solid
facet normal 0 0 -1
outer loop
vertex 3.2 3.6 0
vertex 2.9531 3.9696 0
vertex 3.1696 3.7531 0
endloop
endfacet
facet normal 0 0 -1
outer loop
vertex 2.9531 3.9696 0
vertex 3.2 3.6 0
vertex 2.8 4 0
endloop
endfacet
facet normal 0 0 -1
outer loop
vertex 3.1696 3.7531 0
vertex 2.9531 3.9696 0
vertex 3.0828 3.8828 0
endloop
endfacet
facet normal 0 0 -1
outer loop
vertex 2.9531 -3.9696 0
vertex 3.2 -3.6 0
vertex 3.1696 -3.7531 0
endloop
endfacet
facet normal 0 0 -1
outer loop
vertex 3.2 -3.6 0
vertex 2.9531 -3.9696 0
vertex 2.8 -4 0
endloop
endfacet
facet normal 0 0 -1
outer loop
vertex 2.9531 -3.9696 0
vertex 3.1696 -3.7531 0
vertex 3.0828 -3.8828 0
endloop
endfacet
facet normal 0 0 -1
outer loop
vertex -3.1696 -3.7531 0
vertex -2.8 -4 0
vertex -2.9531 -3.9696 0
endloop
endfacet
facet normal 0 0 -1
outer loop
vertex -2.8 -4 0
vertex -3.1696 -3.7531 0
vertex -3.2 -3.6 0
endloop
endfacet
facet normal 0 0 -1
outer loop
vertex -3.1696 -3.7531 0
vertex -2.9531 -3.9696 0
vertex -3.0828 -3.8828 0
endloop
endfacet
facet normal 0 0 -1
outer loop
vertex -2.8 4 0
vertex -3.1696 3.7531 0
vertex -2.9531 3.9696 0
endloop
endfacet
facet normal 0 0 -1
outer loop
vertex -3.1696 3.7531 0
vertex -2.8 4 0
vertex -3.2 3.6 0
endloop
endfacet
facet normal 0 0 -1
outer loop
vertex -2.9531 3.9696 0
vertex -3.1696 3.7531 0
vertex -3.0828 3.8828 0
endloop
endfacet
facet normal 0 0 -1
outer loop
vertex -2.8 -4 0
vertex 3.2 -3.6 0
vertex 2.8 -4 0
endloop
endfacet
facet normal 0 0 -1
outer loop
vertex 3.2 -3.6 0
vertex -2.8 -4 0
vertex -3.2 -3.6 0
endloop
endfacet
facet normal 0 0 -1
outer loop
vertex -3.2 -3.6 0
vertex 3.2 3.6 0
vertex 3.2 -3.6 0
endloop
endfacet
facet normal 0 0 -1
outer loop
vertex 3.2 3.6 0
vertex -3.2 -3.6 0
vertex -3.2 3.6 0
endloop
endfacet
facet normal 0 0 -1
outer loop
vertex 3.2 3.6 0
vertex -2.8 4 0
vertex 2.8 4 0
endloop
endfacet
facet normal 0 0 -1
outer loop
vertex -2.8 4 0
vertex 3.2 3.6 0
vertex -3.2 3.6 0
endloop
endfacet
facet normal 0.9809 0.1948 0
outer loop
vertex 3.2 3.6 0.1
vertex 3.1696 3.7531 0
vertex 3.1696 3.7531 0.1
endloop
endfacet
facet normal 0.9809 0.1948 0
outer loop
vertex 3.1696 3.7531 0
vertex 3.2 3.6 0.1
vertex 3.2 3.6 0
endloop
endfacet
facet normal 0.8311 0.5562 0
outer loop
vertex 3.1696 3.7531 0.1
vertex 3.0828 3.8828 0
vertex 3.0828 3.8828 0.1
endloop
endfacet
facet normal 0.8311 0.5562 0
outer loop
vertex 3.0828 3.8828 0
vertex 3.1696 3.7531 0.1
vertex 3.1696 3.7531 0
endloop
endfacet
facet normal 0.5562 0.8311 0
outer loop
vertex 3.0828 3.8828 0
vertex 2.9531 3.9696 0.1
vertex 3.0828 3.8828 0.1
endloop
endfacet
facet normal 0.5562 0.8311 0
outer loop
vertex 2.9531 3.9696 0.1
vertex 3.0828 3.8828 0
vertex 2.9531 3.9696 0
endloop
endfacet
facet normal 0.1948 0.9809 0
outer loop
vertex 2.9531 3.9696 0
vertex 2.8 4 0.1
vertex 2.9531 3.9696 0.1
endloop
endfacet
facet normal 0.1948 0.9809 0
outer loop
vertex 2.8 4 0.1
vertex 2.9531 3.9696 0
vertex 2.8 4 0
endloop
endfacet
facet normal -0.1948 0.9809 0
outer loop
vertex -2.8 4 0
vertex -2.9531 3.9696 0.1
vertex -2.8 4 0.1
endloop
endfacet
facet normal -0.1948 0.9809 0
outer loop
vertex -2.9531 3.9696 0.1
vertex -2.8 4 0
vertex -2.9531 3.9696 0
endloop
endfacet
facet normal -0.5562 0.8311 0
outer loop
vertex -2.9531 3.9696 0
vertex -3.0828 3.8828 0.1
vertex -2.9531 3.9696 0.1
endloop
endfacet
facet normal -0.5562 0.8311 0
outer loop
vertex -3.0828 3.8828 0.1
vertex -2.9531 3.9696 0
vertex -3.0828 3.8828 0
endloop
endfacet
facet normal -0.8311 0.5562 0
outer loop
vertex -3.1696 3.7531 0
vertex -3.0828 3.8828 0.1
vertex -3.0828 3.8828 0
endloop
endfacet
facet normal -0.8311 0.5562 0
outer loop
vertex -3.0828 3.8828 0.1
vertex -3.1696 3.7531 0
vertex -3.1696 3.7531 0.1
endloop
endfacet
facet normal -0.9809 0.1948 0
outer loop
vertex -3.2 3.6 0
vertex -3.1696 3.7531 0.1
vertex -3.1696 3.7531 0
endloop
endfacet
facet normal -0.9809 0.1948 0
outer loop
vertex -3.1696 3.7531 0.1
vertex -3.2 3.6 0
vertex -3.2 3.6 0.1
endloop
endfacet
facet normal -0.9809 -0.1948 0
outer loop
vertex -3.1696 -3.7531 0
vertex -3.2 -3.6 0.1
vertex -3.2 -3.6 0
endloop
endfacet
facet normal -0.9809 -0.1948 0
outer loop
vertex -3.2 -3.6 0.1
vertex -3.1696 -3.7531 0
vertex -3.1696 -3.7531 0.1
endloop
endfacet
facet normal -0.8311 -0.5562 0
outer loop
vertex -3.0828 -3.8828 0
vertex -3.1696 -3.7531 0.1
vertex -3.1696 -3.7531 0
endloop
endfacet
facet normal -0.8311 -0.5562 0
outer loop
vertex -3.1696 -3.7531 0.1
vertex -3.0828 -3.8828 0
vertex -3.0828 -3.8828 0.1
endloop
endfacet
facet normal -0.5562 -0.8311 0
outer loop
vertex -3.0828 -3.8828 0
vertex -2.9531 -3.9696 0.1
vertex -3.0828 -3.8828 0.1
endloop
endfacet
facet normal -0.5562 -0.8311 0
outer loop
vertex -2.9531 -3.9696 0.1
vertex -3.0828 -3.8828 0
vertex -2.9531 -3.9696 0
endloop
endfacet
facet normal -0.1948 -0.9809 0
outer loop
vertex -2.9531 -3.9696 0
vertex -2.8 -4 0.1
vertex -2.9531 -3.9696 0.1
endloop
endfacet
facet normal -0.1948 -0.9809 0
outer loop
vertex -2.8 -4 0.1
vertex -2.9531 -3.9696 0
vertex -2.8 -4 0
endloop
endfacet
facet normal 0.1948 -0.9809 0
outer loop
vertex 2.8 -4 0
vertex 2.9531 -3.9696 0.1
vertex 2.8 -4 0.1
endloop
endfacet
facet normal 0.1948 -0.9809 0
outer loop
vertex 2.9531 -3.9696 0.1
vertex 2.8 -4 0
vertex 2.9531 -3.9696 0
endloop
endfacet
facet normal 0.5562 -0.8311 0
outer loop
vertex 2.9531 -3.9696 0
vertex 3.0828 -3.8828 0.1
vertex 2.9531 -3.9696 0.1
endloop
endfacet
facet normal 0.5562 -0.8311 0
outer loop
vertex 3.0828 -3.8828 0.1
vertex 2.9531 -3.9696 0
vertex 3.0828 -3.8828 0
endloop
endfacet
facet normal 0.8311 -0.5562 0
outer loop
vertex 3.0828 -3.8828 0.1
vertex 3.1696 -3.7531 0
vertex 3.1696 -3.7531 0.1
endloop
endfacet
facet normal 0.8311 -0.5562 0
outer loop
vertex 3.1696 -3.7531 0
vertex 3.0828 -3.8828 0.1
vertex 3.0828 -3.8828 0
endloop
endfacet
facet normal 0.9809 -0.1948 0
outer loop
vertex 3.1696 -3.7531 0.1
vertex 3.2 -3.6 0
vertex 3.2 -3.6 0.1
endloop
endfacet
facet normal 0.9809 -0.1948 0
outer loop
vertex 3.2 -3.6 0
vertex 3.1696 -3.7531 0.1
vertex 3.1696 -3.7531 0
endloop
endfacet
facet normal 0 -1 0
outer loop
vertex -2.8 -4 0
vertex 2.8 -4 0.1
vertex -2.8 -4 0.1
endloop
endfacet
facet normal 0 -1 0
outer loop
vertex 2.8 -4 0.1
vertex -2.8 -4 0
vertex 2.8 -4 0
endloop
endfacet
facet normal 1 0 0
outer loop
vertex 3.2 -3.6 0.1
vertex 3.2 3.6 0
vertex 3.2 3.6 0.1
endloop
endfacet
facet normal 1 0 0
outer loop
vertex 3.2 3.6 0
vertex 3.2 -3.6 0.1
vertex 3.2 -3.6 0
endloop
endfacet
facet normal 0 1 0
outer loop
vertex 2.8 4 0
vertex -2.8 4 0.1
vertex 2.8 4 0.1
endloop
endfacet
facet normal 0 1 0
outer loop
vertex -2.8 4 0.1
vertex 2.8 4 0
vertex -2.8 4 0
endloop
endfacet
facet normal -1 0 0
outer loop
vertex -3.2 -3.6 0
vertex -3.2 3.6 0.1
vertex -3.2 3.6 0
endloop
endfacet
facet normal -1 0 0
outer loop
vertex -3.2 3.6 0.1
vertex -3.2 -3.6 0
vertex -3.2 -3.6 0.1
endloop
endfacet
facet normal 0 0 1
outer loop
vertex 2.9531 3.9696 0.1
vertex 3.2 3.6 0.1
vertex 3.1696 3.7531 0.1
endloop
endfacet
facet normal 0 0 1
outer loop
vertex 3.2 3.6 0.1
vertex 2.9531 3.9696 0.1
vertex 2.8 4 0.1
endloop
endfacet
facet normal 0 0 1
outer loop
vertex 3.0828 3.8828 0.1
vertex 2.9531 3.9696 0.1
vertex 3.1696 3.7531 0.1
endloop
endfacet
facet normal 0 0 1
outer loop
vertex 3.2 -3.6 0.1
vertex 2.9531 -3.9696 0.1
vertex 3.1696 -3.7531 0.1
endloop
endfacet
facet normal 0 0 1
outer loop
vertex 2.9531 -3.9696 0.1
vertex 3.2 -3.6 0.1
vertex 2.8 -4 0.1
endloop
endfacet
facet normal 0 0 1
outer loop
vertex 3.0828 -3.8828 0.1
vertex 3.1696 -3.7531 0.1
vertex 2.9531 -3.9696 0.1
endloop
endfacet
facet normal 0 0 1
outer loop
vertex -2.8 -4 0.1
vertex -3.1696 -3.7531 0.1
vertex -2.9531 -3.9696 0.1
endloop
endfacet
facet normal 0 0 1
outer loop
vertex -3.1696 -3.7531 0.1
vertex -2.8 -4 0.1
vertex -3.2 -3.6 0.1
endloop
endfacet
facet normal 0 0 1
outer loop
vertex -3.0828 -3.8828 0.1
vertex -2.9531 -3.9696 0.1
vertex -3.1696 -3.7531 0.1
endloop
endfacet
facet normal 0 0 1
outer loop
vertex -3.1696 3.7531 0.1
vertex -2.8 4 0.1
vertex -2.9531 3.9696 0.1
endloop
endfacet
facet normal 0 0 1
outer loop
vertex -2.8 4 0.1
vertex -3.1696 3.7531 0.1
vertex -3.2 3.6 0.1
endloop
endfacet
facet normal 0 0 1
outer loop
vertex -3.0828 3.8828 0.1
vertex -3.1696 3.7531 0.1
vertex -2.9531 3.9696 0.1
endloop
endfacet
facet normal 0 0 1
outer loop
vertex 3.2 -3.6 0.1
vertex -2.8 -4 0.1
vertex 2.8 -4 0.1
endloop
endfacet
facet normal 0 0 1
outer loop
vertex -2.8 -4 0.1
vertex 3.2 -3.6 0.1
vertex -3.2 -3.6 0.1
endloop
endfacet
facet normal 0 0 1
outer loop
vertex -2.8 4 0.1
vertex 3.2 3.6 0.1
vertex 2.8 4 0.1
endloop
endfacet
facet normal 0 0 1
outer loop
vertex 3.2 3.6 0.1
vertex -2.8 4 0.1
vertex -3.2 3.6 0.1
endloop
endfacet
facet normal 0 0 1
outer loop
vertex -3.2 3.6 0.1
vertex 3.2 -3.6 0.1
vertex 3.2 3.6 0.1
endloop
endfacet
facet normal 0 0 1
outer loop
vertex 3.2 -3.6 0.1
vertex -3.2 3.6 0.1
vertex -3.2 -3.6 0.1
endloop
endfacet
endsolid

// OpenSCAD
// file: ../p/1-4cyli.scad
use <../lib.scad>
function ldraw_lib__1_4cyli() = [
// 0 Cylinder 0.25
// 0 Name: 1-4cyli.dat
// 0 Author: James Jessiman
// 0 !LDRAW_ORG Primitive UPDATE 2012-01
// 0 !LICENSE Licensed under CC BY 4.0 : see CAreadme.txt
// 
// 0 BFC CERTIFY CCW
  [0,"BFC","CERTIFY"],
  [0,"BFC","CCW"],
// 
// 0 !HISTORY 2002-03-23 [sbliss] Added BFC statement.
// 0 !HISTORY 2002-04-25 [PTadmin] Official Update 2002-02
// 0 !HISTORY 2007-06-22 [PTadmin] Header formatted for Contributor Agreement
// 0 !HISTORY 2008-07-01 [PTadmin] Official Update 2008-01
// 0 !HISTORY 2012-02-16 [Philo] Changed to CCW
// 0 !HISTORY 2012-03-30 [PTadmin] Official Update 2012-01
// 
// 
// 4 16 1 1 0 0.9239 1 0.3827 0.9239 0 0.3827 1 0 0
  [4,16,1,1,0,0.9239,1,0.3827,0.9239,0,0.3827,1,0,0],
// 5 24 1 0 0 1 1 0 0.9239 0 0.3827 1 0 -1
  [5,24,1,0,0,1,1,0,0.9239,0,0.3827,1,0,-1],
// 4 16 0.9239 1 0.3827 0.7071 1 0.7071 0.7071 0 0.7071 0.9239 0 0.3827
  [4,16,0.9239,1,0.3827,0.7071,1,0.7071,0.7071,0,0.7071,0.9239,0,0.3827],
// 5 24 0.9239 0 0.3827 0.9239 1 0.3827 0.7071 0 0.7071 1 0 0
  [5,24,0.9239,0,0.3827,0.9239,1,0.3827,0.7071,0,0.7071,1,0,0],
// 4 16 0.7071 1 0.7071 0.3827 1 0.9239 0.3827 0 0.9239 0.7071 0 0.7071
  [4,16,0.7071,1,0.7071,0.3827,1,0.9239,0.3827,0,0.9239,0.7071,0,0.7071],
// 5 24 0.7071 0 0.7071 0.7071 1 0.7071 0.3827 0 0.9239 0.9239 0 0.3827
  [5,24,0.7071,0,0.7071,0.7071,1,0.7071,0.3827,0,0.9239,0.9239,0,0.3827],
// 4 16 0.3827 1 0.9239 0 1 1 0 0 1 0.3827 0 0.9239
  [4,16,0.3827,1,0.9239,0,1,1,0,0,1,0.3827,0,0.9239],
// 5 24 0.3827 0 0.9239 0.3827 1 0.9239 0 0 1 0.7071 0 0.7071
  [5,24,0.3827,0,0.9239,0.3827,1,0.9239,0,0,1,0.7071,0,0.7071],
// 5 24 0 0 1 0 1 1 0.3827 0 0.9239 -1 0 1
  [5,24,0,0,1,0,1,1,0.3827,0,0.9239,-1,0,1],
];
module ldraw_lib__1_4cyli(step=0, col=false, unit=2/5, alt=false, line=0.2, solid=!$preview)
    makepoly(ldraw_lib__1_4cyli(), step=step, col=col, unit=unit, alt=alt, line=line, solid=solid);
ldraw_lib__1_4cyli(line=0.2);
// file: ../p/1-4chrd.scad
use <../lib.scad>
function ldraw_lib__1_4chrd() = [
// 0 Chord 0.25
// 0 Name: 1-4chrd.dat
// 0 Author: Max Martin Richter [MMR1988]
// 0 !LDRAW_ORG Primitive UPDATE 2023-05
// 0 !LICENSE Licensed under CC BY 4.0 : see CAreadme.txt
// 
// 0 BFC CERTIFY CCW
  [0,"BFC","CERTIFY"],
  [0,"BFC","CCW"],
// 
// 0 !HISTORY 2004-04-22 [PTadmin] Official Update 2004-02
// 0 !HISTORY 2007-10-09 [PTadmin] Header formatted for Contributor Agreement
// 0 !HISTORY 2008-07-01 [PTadmin] Official Update 2008-01
// 0 !HISTORY 2012-08-02 [MMR1988] Re-creation with PrimGen2 and Rectifier
// 0 !HISTORY 2012-08-09 [PTadmin] Official Update 2012-02
// 0 !HISTORY 2023-10-27 [OrionP] Change author to MMR1988 from hafhead
// 0 !HISTORY 2023-10-31 [OrionP] Official Update 2023-05
// 
// 4 16 0.9239 0 0.3827 0.3827 0 0.9239 0 0 1 1 0 0
  [4,16,0.9239,0,0.3827,0.3827,0,0.9239,0,0,1,1,0,0],
// 3 16 0.7071 0 0.7071 0.3827 0 0.9239 0.9239 0 0.3827
  [3,16,0.7071,0,0.7071,0.3827,0,0.9239,0.9239,0,0.3827],
];
module ldraw_lib__1_4chrd(step=0, col=false, unit=2/5, alt=false, line=0.2, solid=!$preview)
    makepoly(ldraw_lib__1_4chrd(), step=step, col=col, unit=unit, alt=alt, line=line, solid=solid);
ldraw_lib__1_4chrd(line=0.2);
// main file
use <../lib.scad>
use <../p/1-4chrd.scad>
use <../p/1-4cyli.scad>
function ldraw_lib__6280006m() = [
// 0 Sticker  1 x  0.8 White Rectangle
// 0 Name: 6280006m.dat
// 0 Author: Gabriel Läufer [Dr.Bricktacular]
// 0 !LDRAW_ORG Part UPDATE 2025-02
// 0 !LICENSE Licensed under CC BY 4.0 : see CAreadme.txt
// 
// 0 BFC CERTIFY CCW
  [0,"BFC","CERTIFY"],
  [0,"BFC","CCW"],
// 
// 0 !KEYWORDS Batmobile (1989), Bricklink 76139stk01, Set 76193
// 0 !KEYWORDS Tim Burton's Batman
// 
// 0 !HISTORY 2025-02-27 [OrionP] Official Update 2025-02
// 
// 0 // Sticker-Bottom
// 1 16 7 0 9 1 0 0 0 -1 0 0 0 1 1-4chrd.dat
  [1,16,7,0,9,1,0,0,0,-1,0,0,0,1, ldraw_lib__1_4chrd()],
// 1 16 7 0 -9 0 0 1 0 -1 0 -1 0 0 1-4chrd.dat
  [1,16,7,0,-9,0,0,1,0,-1,0,-1,0,0, ldraw_lib__1_4chrd()],
// 1 16 -7 0 -9 -1 0 0 0 -1 0 0 0 -1 1-4chrd.dat
  [1,16,-7,0,-9,-1,0,0,0,-1,0,0,0,-1, ldraw_lib__1_4chrd()],
// 1 16 -7 0 9 0 0 -1 0 -1 0 1 0 0 1-4chrd.dat
  [1,16,-7,0,9,0,0,-1,0,-1,0,1,0,0, ldraw_lib__1_4chrd()],
// 4 16 7 0 -10 -7 0 -10 -8 0 -9 8 0 -9
  [4,16,7,0,-10,-7,0,-10,-8,0,-9,8,0,-9],
// 4 16 8 0 9 8 0 -9 -8 0 -9 -8 0 9
  [4,16,8,0,9,8,0,-9,-8,0,-9,-8,0,9],
// 4 16 8 0 9 -8 0 9 -7 0 10 7 0 10
  [4,16,8,0,9,-8,0,9,-7,0,10,7,0,10],
// 
// 0 // Sticker-Side
// 1 16 7 -.25 9 1 0 0 0 .25 0 0 0 1 1-4cyli.dat
  [1,16,7,-.25,9,1,0,0,0,.25,0,0,0,1, ldraw_lib__1_4cyli()],
// 1 16 -7 -.25 9 0 0 -1 0 .25 0 1 0 0 1-4cyli.dat
  [1,16,-7,-.25,9,0,0,-1,0,.25,0,1,0,0, ldraw_lib__1_4cyli()],
// 1 16 -7 -.25 -9 -1 0 0 0 .25 0 0 0 -1 1-4cyli.dat
  [1,16,-7,-.25,-9,-1,0,0,0,.25,0,0,0,-1, ldraw_lib__1_4cyli()],
// 1 16 7 -.25 -9 0 0 1 0 .25 0 -1 0 0 1-4cyli.dat
  [1,16,7,-.25,-9,0,0,1,0,.25,0,-1,0,0, ldraw_lib__1_4cyli()],
// 4 16 7 -.25 -10 -7 -.25 -10 -7 0 -10 7 0 -10
  [4,16,7,-.25,-10,-7,-.25,-10,-7,0,-10,7,0,-10],
// 4 16 8 -.25 9 8 -.25 -9 8 0 -9 8 0 9
  [4,16,8,-.25,9,8,-.25,-9,8,0,-9,8,0,9],
// 4 16 -7 -.25 10 7 -.25 10 7 0 10 -7 0 10
  [4,16,-7,-.25,10,7,-.25,10,7,0,10,-7,0,10],
// 4 16 -8 -.25 -9 -8 -.25 9 -8 0 9 -8 0 -9
  [4,16,-8,-.25,-9,-8,-.25,9,-8,0,9,-8,0,-9],
// 
// 0 // Sticker-Front
// 1 15 7 -.25 9 1 0 0 0 1 0 0 0 1 1-4chrd.dat
  [1,15,7,-.25,9,1,0,0,0,1,0,0,0,1, ldraw_lib__1_4chrd()],
// 1 15 7 -.25 -9 0 0 1 0 1 0 -1 0 0 1-4chrd.dat
  [1,15,7,-.25,-9,0,0,1,0,1,0,-1,0,0, ldraw_lib__1_4chrd()],
// 1 15 -7 -.25 -9 -1 0 0 0 1 0 0 0 -1 1-4chrd.dat
  [1,15,-7,-.25,-9,-1,0,0,0,1,0,0,0,-1, ldraw_lib__1_4chrd()],
// 1 15 -7 -.25 9 0 0 -1 0 1 0 1 0 0 1-4chrd.dat
  [1,15,-7,-.25,9,0,0,-1,0,1,0,1,0,0, ldraw_lib__1_4chrd()],
// 4 15 8 -.25 -9 -8 -.25 -9 -7 -.25 -10 7 -.25 -10
  [4,15,8,-.25,-9,-8,-.25,-9,-7,-.25,-10,7,-.25,-10],
// 4 15 8 -.25 9 7 -.25 10 -7 -.25 10 -8 -.25 9
  [4,15,8,-.25,9,7,-.25,10,-7,-.25,10,-8,-.25,9],
// 4 15 -8 -.25 9 -8 -.25 -9 8 -.25 -9 8 -.25 9
  [4,15,-8,-.25,9,-8,-.25,-9,8,-.25,-9,8,-.25,9],
];
module ldraw_lib__6280006m(step=0, col=false, unit=2/5, alt=false, line=0.2, solid=!$preview)
    makepoly(ldraw_lib__6280006m(), step=step, col=col, unit=unit, alt=alt, line=line, solid=solid);
ldraw_lib__6280006m(line=0.2);
